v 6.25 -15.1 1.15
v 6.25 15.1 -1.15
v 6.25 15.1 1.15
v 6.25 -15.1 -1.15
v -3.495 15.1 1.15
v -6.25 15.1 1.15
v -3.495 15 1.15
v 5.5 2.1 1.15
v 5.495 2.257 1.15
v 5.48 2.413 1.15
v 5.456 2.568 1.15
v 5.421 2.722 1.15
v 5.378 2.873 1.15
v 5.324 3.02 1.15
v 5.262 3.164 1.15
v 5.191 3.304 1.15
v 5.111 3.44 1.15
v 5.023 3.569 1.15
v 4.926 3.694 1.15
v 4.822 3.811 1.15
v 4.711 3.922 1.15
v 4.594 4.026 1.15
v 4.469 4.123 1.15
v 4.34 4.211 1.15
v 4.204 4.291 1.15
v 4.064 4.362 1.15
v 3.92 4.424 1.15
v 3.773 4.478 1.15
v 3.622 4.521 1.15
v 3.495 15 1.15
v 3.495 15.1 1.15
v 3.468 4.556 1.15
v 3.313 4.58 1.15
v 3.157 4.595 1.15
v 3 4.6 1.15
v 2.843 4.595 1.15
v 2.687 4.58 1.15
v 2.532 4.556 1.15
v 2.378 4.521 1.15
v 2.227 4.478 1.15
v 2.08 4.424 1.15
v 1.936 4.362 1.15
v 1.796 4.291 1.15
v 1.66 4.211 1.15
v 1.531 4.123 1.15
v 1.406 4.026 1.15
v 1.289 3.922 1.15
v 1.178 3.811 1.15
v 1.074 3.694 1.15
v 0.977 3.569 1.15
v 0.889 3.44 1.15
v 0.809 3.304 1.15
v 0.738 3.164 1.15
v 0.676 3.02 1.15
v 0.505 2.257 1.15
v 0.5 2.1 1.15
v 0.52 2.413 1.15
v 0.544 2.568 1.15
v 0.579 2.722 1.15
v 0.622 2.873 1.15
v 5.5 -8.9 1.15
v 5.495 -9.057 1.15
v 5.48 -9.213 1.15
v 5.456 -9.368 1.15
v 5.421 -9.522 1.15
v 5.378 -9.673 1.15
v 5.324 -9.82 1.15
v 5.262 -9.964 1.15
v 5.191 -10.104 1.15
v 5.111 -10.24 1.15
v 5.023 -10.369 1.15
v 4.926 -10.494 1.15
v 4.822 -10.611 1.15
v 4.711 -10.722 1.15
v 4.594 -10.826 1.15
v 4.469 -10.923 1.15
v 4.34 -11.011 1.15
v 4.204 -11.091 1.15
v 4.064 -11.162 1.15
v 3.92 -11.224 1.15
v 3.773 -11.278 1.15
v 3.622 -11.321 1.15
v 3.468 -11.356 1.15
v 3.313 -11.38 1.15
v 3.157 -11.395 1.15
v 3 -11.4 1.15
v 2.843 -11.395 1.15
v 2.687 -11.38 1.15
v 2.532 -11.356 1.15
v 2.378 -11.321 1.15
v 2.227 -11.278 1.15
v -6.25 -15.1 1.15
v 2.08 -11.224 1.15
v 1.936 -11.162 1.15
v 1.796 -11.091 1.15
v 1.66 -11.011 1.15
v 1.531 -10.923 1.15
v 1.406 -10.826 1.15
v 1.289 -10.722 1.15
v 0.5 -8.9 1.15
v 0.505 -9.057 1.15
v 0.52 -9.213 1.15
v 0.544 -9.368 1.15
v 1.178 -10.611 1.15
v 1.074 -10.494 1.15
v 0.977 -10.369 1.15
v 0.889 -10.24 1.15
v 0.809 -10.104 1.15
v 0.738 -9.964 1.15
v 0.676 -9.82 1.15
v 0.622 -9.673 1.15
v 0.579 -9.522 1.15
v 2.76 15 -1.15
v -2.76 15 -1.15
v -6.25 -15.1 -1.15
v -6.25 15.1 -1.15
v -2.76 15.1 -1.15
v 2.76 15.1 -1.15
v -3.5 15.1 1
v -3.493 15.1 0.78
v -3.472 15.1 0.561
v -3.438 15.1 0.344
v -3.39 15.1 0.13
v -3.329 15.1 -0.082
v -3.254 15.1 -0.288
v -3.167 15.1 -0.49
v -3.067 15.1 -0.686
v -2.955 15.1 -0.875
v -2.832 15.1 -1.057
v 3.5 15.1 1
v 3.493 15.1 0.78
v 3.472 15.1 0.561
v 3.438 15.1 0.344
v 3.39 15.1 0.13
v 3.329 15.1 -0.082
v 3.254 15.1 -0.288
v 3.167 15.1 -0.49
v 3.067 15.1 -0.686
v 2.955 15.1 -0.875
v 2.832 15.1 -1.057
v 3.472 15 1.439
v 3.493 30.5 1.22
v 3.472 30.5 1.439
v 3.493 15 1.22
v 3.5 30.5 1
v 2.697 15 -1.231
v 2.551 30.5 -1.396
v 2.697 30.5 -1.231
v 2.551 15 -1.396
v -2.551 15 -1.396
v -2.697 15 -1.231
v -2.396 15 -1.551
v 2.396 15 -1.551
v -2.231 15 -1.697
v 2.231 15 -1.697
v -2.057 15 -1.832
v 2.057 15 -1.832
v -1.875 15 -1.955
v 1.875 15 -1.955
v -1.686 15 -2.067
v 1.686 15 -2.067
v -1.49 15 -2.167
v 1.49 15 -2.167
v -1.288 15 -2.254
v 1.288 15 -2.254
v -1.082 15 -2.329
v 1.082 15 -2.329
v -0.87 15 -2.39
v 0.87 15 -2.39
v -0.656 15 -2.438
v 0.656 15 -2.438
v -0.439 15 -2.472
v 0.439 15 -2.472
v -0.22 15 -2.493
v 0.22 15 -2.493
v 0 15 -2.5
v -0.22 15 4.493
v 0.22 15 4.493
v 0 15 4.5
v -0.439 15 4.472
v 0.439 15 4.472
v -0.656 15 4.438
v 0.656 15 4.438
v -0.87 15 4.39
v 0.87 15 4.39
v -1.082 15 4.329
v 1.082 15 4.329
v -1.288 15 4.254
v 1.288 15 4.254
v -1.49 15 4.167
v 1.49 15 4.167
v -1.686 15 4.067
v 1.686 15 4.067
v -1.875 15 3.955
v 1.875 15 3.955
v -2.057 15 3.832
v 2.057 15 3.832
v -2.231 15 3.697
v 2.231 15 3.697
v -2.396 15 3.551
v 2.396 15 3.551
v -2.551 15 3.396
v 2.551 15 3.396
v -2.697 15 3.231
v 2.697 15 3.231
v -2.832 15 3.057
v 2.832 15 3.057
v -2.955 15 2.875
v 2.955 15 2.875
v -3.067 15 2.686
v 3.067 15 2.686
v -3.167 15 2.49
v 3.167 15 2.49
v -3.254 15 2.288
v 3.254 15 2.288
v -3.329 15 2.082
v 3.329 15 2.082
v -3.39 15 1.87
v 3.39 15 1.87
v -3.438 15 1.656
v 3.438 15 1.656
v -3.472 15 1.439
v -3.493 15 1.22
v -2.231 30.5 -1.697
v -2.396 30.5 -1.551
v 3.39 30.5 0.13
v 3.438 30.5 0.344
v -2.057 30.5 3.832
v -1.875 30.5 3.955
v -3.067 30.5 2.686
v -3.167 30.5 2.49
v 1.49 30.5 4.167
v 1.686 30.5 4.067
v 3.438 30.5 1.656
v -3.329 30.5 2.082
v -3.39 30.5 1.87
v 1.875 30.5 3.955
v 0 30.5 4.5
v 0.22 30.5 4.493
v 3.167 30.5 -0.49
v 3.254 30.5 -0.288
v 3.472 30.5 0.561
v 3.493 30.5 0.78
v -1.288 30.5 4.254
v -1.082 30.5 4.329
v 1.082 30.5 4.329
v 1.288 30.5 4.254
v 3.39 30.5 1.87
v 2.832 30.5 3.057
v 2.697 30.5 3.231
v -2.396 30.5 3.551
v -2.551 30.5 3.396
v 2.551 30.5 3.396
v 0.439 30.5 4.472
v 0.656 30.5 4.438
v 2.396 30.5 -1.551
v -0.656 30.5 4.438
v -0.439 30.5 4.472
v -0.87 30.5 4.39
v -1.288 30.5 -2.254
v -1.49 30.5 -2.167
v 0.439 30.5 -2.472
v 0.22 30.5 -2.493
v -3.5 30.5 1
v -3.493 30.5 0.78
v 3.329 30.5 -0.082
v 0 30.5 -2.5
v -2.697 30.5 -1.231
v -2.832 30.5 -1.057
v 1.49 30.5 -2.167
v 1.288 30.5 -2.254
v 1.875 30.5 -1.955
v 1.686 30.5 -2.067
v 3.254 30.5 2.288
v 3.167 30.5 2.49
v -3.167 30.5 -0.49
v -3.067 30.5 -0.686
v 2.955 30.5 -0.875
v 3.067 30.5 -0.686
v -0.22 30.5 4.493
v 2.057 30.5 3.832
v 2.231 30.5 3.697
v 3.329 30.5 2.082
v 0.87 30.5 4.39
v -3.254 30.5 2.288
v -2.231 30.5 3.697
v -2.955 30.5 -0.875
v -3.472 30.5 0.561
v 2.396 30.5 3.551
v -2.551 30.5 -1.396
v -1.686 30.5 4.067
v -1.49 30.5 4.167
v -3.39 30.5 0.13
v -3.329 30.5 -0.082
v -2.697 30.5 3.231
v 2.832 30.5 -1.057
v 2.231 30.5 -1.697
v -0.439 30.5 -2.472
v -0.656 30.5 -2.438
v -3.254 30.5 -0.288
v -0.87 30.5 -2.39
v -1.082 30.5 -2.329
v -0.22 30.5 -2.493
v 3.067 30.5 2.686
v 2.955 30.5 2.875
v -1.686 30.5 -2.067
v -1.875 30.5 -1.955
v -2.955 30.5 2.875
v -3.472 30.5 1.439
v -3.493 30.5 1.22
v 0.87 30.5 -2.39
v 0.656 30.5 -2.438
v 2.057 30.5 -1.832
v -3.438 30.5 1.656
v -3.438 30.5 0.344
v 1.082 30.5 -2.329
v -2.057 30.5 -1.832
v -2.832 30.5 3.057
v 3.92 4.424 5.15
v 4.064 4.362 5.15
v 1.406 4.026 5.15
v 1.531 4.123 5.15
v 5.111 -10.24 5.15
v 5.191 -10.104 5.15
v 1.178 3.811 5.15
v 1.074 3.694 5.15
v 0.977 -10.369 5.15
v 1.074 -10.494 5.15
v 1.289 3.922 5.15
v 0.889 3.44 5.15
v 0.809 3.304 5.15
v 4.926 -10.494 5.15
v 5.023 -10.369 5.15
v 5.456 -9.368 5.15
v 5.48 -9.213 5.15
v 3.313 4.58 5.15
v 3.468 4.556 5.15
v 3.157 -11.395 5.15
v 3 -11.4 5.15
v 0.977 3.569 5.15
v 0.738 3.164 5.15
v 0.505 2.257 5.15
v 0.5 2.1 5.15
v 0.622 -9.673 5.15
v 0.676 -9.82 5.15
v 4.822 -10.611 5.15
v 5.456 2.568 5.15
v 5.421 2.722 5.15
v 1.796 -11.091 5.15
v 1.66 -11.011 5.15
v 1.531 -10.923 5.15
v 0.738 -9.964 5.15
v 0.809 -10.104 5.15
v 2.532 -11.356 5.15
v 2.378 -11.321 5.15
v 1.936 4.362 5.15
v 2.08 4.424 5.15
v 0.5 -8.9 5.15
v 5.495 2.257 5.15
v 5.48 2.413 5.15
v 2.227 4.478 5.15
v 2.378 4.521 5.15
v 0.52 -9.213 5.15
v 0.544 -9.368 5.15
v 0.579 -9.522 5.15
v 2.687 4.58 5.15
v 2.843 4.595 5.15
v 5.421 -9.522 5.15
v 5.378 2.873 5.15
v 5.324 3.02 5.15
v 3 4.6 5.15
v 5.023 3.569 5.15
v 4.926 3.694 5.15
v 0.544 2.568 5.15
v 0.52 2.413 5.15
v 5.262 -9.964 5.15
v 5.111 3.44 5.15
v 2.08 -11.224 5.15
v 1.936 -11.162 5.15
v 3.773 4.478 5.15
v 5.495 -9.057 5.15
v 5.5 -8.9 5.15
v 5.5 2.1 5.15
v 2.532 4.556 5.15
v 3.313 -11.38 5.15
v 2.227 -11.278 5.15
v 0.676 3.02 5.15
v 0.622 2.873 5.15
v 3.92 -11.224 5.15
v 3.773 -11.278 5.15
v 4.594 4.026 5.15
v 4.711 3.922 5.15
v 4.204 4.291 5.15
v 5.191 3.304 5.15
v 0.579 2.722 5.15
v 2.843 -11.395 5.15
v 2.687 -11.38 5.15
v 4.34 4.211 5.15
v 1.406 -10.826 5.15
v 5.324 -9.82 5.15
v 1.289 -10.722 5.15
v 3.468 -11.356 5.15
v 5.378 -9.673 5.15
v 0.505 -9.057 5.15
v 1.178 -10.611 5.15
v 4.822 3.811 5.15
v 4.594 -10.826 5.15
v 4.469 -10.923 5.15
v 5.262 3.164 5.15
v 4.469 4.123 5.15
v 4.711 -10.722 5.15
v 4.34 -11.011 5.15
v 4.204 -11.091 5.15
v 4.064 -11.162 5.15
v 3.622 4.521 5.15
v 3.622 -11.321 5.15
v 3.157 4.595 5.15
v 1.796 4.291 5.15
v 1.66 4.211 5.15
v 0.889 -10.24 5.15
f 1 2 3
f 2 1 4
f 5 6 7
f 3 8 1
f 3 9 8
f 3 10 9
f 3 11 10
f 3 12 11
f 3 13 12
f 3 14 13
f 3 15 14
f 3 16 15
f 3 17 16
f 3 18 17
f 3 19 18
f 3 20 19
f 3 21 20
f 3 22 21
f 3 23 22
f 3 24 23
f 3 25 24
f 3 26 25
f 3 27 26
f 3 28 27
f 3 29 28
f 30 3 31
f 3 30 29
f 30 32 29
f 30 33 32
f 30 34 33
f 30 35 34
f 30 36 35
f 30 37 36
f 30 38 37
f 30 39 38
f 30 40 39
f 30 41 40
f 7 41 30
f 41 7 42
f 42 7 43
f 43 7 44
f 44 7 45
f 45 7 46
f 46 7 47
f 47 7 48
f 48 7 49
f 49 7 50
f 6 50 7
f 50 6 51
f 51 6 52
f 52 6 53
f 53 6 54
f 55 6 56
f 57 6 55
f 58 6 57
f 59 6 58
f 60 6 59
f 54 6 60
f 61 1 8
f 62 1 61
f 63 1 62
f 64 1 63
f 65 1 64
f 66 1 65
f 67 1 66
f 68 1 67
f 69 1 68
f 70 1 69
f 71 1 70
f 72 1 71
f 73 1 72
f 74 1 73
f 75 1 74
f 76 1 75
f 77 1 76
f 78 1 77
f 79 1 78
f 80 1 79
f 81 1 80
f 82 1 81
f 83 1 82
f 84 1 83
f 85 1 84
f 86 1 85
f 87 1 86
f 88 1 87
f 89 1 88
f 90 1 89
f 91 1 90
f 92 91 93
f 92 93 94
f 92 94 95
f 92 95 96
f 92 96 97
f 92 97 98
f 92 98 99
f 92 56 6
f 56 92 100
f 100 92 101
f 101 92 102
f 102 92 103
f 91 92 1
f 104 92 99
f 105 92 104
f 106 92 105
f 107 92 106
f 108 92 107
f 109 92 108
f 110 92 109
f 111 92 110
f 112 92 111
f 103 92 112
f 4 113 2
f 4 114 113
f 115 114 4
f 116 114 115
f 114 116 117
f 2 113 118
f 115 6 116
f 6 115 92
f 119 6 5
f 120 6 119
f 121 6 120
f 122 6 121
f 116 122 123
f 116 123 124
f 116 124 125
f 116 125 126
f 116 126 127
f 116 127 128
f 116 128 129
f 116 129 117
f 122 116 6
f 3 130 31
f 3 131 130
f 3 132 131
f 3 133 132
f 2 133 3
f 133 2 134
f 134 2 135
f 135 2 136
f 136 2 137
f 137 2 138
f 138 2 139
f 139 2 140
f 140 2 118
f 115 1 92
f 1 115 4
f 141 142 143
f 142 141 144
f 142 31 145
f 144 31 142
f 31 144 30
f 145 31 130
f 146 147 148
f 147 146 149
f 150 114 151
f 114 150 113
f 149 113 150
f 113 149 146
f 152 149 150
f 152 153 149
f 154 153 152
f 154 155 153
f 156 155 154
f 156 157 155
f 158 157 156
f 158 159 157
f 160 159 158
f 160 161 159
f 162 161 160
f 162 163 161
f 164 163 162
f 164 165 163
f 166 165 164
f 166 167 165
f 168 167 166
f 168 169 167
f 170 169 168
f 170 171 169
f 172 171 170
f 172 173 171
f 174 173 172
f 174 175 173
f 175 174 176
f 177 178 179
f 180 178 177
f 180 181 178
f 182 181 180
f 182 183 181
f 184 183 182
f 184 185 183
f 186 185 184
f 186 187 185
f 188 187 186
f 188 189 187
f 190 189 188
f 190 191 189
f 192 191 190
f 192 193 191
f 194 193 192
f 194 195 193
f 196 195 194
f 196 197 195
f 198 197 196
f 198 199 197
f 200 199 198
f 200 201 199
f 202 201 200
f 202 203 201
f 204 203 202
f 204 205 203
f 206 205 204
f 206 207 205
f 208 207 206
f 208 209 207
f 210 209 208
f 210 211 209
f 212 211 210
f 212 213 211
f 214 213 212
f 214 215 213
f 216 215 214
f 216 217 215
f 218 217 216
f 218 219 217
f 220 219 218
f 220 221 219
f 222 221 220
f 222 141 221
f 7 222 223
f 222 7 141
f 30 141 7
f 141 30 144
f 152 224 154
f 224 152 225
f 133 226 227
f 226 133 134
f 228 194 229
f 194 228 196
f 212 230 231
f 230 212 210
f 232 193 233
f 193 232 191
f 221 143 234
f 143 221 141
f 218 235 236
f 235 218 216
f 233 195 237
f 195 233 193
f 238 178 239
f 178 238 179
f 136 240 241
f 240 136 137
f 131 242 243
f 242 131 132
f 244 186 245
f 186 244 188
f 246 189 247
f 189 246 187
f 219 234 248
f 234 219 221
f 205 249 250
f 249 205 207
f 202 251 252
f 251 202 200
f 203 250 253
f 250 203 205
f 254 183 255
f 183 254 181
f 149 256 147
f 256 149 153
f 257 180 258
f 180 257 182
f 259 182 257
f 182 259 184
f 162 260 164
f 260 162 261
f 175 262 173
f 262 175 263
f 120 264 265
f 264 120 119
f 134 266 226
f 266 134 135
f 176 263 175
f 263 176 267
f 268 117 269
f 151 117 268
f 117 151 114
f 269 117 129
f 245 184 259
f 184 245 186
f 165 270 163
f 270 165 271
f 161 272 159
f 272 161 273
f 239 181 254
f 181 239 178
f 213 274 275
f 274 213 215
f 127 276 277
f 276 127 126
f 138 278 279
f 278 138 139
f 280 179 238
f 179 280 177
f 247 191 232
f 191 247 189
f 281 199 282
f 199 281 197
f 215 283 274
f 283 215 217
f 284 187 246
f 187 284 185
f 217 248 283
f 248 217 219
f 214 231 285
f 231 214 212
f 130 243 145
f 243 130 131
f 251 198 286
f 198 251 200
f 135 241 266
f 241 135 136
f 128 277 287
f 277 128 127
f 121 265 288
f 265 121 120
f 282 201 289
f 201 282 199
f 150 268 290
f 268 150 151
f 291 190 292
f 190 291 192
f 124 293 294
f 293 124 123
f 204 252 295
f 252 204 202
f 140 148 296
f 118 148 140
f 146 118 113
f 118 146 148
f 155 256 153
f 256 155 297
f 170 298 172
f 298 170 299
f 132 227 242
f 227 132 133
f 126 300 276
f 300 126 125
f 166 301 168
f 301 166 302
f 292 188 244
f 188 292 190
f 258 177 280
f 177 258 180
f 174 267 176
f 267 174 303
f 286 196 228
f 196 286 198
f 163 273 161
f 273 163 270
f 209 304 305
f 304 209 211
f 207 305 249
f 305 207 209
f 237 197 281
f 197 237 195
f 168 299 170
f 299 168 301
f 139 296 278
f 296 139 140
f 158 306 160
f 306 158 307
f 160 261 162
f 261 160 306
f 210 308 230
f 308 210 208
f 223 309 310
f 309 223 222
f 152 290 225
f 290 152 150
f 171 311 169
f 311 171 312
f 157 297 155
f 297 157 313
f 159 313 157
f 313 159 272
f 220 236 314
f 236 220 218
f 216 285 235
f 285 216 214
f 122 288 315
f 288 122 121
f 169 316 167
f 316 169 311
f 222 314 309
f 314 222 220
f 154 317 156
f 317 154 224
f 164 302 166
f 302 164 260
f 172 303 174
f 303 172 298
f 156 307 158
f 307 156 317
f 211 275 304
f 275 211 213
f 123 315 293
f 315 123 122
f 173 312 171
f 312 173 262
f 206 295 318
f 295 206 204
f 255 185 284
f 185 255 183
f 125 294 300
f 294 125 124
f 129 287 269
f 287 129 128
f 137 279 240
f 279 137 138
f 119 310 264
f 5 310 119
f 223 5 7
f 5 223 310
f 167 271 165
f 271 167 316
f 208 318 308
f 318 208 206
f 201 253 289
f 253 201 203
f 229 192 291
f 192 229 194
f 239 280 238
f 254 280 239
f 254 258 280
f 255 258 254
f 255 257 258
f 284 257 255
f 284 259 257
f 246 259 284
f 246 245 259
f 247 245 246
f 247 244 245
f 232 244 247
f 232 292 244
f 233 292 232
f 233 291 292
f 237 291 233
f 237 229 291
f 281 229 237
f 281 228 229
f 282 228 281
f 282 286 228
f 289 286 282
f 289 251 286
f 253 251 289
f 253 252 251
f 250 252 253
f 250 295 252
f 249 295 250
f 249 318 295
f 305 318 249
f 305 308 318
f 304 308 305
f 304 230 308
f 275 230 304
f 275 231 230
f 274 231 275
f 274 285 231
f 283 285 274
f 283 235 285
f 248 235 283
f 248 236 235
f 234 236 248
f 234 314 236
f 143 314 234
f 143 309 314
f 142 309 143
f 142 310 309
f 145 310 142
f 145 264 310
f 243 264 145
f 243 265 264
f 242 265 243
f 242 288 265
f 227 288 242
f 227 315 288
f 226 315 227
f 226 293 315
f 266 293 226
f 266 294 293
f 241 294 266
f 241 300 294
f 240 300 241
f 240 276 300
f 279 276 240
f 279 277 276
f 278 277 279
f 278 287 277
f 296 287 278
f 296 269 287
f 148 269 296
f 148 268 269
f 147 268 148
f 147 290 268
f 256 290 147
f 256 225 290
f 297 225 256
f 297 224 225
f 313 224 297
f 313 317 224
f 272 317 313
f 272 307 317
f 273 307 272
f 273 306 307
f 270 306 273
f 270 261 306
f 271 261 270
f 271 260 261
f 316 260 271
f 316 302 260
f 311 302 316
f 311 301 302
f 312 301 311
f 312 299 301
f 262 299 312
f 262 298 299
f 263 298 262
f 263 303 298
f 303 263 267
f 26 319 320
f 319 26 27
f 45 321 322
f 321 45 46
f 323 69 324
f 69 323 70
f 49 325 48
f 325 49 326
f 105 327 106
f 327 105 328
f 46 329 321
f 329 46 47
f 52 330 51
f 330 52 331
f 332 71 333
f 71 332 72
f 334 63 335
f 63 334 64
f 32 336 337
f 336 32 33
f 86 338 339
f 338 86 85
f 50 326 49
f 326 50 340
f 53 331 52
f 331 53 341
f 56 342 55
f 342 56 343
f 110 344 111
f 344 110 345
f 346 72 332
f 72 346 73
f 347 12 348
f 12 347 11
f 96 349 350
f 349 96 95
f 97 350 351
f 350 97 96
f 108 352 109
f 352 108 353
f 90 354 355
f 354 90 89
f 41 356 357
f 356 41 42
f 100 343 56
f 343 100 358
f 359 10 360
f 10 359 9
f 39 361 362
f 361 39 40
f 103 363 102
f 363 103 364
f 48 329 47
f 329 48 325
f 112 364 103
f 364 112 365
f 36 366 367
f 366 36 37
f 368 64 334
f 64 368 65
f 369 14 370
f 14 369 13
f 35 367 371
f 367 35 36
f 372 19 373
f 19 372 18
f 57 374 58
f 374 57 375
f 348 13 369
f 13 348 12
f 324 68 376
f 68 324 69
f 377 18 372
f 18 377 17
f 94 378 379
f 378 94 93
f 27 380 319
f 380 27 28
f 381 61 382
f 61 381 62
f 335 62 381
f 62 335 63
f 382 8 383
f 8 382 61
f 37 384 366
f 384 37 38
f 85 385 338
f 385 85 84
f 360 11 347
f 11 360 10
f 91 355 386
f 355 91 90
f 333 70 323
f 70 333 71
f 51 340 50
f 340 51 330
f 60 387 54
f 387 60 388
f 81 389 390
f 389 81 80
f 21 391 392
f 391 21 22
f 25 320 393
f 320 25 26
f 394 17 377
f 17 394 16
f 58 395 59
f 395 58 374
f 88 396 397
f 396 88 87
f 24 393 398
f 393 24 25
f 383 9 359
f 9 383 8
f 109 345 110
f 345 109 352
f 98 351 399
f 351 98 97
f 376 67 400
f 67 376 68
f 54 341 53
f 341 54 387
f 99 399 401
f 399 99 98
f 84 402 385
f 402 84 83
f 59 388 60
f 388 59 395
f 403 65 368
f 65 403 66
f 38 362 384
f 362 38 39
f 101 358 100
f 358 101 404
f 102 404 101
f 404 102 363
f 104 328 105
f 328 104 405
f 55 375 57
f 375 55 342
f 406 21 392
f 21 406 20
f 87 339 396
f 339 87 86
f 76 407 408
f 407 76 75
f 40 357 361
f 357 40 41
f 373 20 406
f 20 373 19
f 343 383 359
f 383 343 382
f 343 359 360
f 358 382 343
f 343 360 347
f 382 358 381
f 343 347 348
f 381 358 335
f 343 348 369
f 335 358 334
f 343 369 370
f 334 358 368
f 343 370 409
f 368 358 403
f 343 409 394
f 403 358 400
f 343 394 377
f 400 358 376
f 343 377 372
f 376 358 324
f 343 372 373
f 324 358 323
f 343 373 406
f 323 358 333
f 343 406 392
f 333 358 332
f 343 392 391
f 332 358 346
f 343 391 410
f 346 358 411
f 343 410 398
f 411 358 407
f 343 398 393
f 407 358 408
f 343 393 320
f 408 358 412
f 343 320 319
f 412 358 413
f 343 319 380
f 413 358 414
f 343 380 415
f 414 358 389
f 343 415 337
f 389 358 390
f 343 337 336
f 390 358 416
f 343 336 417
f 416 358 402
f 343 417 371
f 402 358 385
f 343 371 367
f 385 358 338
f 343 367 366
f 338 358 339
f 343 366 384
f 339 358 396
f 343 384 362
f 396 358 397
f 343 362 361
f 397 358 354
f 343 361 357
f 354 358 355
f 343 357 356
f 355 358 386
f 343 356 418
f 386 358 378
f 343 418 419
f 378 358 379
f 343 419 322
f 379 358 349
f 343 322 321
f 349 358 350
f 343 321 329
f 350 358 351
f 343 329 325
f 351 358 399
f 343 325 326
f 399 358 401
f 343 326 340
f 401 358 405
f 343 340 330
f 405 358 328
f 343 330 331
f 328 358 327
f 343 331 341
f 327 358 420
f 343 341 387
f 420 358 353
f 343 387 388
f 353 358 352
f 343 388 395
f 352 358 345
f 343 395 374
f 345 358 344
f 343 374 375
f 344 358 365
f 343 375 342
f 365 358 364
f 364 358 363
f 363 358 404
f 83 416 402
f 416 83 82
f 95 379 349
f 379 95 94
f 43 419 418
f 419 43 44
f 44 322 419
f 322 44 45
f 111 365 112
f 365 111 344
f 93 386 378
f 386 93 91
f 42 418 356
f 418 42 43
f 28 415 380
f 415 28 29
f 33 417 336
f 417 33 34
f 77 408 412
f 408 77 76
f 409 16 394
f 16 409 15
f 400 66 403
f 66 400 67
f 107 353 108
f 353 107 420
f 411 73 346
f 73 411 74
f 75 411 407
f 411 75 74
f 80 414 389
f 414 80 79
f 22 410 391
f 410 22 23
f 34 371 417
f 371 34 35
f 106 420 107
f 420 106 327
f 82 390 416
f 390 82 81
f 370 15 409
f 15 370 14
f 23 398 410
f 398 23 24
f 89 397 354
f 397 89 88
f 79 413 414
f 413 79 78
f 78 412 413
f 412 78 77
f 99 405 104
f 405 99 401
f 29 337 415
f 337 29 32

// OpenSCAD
module make_mic(tol=0, condenser_length=0){
    
    cube([12.5+tol, 30.2+tol, 2.3+tol], center=true);
    
    translate([0, 30.2/2+5.3/2 + condenser_length/2, 1])
    rotate([90,0,0])
    cylinder(d=7+tol, h=5.5+tol+condenser_length, center=true, $fn=100);
    
    //color("blue")
    hull()
    for(i=[-1:2:1])
    translate([3.75-.75, 11/2*i - 7 + 3.6, 4/2 + 2.3/2])
    cylinder(d=5, h=4, center=true, $fn=100);
    
}

make_mic(tol=0, condenser_length=10);
